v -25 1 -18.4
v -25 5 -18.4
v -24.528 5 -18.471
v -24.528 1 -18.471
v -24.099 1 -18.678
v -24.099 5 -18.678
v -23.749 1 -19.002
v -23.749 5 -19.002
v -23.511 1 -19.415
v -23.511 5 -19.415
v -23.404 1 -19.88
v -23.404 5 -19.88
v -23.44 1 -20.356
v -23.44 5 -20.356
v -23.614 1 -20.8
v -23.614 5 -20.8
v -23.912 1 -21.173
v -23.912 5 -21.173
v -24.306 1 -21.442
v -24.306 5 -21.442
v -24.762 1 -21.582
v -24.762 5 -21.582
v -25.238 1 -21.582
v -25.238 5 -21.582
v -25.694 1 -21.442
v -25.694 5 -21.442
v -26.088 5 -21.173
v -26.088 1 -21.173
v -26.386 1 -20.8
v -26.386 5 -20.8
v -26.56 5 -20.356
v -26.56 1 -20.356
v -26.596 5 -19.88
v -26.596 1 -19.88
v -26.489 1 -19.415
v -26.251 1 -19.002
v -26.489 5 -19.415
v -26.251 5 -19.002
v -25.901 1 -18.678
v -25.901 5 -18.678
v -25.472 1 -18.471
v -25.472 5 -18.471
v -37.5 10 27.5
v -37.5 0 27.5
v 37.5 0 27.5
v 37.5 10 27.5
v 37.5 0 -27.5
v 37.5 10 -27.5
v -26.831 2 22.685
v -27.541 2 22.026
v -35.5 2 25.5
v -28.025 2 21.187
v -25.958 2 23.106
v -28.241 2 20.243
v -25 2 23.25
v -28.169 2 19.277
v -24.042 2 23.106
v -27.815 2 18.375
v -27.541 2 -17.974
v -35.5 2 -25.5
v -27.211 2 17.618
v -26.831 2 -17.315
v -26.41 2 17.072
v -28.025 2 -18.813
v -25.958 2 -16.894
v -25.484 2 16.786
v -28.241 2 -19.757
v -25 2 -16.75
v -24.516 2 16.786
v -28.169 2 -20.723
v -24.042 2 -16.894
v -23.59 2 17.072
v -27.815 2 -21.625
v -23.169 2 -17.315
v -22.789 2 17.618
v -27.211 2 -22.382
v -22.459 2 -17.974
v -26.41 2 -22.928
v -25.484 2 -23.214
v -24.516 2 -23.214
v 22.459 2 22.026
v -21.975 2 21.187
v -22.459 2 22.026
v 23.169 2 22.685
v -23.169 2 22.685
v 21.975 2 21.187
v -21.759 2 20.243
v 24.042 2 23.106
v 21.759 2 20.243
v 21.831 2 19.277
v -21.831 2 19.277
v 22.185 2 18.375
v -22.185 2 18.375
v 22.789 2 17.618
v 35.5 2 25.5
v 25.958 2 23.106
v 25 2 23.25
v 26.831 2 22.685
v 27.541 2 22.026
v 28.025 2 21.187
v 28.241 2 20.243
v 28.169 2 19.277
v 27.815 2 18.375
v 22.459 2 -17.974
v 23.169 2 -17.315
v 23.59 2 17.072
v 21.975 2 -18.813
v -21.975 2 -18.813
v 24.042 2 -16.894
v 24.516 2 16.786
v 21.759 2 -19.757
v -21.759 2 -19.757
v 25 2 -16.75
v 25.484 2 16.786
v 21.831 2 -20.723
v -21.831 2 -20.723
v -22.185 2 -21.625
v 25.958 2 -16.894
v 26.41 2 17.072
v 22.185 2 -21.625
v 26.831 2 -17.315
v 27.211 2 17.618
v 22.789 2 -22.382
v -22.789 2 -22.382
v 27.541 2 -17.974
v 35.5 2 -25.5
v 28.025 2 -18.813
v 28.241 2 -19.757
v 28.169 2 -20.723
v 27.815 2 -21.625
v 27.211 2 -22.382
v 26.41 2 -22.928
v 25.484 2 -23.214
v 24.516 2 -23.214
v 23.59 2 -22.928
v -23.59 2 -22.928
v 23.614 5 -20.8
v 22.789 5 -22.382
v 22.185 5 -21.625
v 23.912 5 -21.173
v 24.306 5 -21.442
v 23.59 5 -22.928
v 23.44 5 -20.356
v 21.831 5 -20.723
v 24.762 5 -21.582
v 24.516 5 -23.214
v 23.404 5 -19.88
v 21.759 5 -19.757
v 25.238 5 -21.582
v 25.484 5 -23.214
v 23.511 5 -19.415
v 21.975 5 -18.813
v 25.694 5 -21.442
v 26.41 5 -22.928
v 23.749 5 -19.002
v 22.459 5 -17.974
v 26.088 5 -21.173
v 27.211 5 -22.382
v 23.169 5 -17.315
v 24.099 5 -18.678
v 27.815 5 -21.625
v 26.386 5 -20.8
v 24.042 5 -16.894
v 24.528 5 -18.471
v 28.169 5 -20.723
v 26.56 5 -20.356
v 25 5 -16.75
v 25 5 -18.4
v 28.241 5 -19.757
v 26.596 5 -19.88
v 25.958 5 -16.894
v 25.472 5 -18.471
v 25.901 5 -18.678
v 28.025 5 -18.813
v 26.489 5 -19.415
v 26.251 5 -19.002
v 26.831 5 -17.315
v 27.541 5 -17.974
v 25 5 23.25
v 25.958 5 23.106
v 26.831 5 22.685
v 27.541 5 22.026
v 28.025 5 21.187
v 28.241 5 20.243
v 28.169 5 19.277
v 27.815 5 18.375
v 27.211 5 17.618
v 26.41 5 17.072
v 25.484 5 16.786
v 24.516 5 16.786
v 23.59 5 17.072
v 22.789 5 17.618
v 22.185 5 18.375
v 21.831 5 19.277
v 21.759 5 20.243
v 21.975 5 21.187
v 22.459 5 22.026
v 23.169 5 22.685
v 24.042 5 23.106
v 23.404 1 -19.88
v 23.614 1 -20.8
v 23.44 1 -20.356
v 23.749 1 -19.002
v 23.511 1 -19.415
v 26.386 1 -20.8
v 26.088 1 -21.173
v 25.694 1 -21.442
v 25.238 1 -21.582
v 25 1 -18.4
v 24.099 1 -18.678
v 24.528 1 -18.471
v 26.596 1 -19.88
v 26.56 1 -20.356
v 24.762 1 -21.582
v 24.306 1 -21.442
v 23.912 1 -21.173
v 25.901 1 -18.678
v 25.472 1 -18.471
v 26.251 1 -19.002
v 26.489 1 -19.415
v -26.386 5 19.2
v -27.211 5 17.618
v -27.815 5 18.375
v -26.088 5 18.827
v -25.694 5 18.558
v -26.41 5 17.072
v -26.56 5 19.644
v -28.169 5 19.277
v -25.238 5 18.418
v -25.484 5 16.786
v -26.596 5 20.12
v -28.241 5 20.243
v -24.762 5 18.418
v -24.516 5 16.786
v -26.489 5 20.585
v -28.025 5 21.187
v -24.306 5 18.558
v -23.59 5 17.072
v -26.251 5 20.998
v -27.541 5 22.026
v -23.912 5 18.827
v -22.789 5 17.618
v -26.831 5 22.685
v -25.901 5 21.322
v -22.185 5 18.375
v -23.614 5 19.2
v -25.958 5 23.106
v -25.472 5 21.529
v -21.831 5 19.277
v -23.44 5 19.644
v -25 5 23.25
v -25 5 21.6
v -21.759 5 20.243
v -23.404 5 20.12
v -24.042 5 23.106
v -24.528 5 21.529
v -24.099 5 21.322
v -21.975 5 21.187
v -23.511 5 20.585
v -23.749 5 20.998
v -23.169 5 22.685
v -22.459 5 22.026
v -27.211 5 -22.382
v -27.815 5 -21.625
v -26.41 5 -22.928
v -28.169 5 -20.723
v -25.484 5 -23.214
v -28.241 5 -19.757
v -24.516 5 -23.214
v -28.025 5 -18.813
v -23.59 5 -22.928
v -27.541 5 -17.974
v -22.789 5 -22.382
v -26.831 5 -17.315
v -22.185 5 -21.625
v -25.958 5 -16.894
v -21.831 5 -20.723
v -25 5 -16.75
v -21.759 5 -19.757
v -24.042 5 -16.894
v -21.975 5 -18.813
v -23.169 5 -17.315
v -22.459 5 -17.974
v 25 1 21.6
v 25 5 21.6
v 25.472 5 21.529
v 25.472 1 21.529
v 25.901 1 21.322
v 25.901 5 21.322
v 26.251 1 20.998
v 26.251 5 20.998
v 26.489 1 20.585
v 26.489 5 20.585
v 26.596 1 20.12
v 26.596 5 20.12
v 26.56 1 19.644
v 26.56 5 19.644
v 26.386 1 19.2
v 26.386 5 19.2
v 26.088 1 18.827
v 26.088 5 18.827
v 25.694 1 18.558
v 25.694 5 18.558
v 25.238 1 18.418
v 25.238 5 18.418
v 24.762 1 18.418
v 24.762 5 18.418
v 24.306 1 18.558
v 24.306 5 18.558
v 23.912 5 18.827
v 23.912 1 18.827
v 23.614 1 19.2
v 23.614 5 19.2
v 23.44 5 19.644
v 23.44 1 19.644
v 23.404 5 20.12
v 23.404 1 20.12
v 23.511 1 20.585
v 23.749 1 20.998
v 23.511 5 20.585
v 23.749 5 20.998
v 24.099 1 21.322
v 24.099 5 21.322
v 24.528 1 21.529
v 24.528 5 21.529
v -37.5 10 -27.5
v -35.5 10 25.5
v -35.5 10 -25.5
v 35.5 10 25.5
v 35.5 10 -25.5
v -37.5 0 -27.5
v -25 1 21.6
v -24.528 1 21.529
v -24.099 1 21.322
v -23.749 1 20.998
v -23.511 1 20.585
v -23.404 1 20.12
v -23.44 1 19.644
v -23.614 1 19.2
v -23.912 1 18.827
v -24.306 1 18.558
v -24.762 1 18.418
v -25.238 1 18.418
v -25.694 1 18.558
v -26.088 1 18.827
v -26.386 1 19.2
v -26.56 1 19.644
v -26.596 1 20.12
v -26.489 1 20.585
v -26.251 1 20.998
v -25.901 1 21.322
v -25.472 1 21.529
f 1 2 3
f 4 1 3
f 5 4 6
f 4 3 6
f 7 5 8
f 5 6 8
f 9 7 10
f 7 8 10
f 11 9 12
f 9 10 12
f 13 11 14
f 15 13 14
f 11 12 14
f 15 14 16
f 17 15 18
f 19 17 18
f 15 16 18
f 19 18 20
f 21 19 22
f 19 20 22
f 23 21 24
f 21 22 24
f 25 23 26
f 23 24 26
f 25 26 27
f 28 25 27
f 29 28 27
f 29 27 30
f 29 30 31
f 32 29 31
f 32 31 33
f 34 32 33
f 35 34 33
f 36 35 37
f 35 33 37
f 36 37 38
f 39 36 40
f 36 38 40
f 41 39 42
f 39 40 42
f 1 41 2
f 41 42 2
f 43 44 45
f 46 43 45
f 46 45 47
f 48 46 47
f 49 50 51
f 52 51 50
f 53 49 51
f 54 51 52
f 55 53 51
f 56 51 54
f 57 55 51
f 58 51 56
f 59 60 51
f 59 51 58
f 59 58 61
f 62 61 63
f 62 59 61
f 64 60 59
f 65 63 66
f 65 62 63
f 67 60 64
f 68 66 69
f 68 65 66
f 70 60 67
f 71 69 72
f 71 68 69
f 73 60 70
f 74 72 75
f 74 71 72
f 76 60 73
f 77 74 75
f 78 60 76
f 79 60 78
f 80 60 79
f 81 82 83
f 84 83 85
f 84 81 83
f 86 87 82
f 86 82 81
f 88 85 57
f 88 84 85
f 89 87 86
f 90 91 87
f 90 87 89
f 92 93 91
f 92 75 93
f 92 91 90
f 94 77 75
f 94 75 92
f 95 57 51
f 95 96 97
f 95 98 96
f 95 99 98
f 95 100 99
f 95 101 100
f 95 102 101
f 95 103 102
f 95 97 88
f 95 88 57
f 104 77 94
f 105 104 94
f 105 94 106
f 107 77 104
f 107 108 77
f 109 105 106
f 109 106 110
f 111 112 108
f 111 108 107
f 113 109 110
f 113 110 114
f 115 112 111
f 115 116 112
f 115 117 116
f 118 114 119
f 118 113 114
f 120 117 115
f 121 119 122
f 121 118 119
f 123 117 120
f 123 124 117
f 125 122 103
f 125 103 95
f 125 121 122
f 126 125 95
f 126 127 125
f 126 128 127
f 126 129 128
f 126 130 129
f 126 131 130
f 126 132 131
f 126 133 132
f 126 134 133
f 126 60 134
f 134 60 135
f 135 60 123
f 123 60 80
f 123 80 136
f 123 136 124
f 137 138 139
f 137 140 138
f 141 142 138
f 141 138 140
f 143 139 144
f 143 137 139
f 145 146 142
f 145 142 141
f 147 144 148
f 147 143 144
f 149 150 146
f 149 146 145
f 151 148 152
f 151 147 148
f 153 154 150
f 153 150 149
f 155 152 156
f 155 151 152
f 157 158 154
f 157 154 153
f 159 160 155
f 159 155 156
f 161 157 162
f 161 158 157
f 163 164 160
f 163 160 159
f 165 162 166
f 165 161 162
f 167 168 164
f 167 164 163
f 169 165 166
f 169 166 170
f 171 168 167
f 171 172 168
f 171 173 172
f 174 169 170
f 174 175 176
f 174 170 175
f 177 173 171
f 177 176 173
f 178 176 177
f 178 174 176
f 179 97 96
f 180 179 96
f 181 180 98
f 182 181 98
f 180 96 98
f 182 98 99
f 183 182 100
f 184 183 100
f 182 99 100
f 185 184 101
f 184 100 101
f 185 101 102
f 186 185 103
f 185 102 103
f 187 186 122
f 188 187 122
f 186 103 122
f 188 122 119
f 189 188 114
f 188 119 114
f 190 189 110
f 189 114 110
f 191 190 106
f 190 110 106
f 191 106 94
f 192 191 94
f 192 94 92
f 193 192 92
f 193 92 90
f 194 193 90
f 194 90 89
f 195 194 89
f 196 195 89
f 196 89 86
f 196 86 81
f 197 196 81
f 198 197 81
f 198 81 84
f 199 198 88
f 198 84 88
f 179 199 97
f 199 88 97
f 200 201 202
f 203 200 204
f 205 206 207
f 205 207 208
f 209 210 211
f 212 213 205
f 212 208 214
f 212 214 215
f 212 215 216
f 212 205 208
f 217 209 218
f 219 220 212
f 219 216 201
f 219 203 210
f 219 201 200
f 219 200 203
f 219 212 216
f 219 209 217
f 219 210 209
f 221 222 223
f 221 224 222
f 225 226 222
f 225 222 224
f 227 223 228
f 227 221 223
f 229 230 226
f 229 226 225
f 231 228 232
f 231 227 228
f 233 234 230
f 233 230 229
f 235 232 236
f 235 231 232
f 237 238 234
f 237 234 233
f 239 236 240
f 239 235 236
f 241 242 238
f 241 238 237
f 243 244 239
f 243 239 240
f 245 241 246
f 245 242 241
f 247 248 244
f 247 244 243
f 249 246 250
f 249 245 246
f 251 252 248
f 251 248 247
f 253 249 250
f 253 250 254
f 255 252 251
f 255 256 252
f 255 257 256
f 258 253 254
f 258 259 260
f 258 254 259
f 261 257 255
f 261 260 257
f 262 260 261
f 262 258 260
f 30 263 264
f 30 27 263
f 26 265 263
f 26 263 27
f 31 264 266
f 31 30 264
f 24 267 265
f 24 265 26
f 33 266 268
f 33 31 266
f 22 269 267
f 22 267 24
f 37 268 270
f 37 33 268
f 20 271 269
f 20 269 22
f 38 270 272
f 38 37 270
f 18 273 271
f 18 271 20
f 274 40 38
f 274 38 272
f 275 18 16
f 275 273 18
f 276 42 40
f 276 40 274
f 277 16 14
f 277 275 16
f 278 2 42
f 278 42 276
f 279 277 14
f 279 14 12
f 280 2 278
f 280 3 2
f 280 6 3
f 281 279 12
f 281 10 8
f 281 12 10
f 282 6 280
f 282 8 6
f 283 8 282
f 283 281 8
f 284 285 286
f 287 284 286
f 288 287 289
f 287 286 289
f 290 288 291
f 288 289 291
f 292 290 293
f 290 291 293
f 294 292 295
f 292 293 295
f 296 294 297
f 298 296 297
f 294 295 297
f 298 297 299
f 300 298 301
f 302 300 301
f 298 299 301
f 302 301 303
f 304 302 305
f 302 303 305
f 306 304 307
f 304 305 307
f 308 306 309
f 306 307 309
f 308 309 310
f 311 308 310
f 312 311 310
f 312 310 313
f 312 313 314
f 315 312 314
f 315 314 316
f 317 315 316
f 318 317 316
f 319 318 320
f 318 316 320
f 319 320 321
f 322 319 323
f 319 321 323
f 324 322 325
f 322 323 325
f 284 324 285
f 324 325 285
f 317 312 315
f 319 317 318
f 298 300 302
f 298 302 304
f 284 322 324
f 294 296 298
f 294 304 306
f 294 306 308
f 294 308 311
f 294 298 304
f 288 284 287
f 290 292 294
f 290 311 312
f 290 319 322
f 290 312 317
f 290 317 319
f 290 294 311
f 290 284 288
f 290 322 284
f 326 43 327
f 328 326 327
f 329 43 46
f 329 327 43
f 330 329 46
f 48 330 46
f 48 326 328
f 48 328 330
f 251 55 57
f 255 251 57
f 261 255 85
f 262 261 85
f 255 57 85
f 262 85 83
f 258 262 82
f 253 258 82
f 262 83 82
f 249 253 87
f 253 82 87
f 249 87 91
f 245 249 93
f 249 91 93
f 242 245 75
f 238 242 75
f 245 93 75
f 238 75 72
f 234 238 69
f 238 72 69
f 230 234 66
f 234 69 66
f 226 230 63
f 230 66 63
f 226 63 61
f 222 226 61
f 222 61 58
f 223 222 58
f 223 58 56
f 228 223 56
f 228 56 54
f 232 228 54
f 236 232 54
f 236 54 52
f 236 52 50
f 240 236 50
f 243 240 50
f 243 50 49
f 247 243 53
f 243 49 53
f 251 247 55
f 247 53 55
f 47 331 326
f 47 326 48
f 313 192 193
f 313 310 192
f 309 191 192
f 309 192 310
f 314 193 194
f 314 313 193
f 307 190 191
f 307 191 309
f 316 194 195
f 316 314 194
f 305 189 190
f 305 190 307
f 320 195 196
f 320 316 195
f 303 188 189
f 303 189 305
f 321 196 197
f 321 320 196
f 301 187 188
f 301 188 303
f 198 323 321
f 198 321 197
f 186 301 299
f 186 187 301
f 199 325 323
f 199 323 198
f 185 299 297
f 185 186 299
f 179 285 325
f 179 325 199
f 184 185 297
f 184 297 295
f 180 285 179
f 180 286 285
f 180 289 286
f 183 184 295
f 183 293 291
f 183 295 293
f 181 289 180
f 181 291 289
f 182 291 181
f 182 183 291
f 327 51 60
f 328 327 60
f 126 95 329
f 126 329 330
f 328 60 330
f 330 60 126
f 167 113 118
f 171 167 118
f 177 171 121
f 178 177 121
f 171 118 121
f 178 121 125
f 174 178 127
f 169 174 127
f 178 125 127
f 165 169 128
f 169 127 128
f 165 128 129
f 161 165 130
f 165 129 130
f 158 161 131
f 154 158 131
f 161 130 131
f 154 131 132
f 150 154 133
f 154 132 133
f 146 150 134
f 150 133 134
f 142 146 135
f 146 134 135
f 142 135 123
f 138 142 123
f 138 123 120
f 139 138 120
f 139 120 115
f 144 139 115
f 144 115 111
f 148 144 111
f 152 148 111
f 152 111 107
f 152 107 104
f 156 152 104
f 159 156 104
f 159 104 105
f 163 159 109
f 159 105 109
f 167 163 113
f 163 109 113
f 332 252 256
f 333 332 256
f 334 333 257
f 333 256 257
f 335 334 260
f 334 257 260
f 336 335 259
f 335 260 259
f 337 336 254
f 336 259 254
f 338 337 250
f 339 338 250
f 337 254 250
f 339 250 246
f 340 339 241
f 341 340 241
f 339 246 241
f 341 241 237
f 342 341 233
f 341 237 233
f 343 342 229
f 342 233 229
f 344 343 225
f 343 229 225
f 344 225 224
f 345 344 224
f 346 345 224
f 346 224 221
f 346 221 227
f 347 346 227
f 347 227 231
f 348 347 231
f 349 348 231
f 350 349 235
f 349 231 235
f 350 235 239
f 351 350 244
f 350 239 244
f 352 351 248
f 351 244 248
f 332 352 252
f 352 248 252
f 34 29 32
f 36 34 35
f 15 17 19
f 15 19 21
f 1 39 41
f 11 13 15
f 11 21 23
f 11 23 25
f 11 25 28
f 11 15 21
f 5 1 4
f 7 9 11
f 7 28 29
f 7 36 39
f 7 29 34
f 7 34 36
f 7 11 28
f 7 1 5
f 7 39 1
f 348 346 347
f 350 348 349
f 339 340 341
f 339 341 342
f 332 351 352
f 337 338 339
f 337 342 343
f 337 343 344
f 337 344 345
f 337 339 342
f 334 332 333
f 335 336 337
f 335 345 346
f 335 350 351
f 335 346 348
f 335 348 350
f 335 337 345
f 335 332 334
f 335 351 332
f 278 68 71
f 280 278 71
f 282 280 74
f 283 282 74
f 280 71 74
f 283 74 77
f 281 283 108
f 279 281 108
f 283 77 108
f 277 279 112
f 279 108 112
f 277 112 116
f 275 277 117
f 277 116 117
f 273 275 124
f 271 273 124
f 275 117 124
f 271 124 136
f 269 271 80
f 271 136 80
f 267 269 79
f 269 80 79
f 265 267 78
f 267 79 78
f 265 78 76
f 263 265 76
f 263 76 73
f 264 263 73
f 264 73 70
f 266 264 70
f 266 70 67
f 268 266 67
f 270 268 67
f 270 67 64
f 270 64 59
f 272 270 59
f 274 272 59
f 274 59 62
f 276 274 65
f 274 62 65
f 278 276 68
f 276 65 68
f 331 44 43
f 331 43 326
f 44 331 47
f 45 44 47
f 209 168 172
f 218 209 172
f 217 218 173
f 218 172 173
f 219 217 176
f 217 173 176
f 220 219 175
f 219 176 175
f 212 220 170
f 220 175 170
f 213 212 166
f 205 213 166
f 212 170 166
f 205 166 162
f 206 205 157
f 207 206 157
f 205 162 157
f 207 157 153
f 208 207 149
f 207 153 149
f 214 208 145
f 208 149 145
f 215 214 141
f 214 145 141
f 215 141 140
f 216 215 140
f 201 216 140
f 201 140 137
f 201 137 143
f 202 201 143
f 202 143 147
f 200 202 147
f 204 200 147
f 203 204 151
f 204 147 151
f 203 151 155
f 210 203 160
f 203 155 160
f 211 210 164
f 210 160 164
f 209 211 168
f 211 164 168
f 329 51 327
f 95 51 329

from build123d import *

# Parameters (mm, degrees)
SKETCH1_W             = 75
SKETCH1_H             = 55
BODY_DEPTH            = 10
SHELL1_T              = -2
SKETCH2_R             = 3.25
INSERTS_SUPPORT_DEPTH = 3
SKETCH3_R             = 1.6
INSERTS_HOLES_DEPTH   = 4


with BuildPart() as part:
    # Sketch1 → Body (new body)
    with BuildSketch(Plane(origin=(0, 0, 0), x_dir=(1, 0, 0), z_dir=(0, 1, 0))):
        Rectangle(SKETCH1_W, SKETCH1_H)
    extrude(amount=BODY_DEPTH)

    # Shell1
    shell1_openings = [part.faces().sort_by_distance(p)[0] for p in [
        (0, 10, 0),
    ]]
    offset(amount=SHELL1_T, openings=shell1_openings, kind=Kind.INTERSECTION)

    # Sketch2 → Inserts_Support (add)
    with BuildSketch(Plane(origin=(0, 2, 0), x_dir=(1, 0, 0), z_dir=(0, 1, 0))):
        with Locations(Location((-25, 20, 0), (0, 0, 270))):
            Circle(SKETCH2_R)
        with Locations(Location((25, 20, 0), (0, 0, 270))):
            Circle(SKETCH2_R)
        with Locations(Location((25, -20, 0), (0, 0, 270))):
            Circle(SKETCH2_R)
        with Locations(Location((-25, -20, 0), (0, 0, 270))):
            Circle(SKETCH2_R)
    extrude(amount=INSERTS_SUPPORT_DEPTH)

    # Sketch3 → Inserts_Holes (cut)
    with BuildSketch(Plane(origin=(0, 5, 0), x_dir=(1, 0, 0), z_dir=(0, 1, 0))):
        with Locations(Location((-25, 20, 0), (0, 0, 270))):
            Circle(SKETCH3_R)
        with Locations(Location((25, 20, 0), (0, 0, 270))):
            Circle(SKETCH3_R)
        with Locations(Location((25, -20, 0), (0, 0, 270))):
            Circle(SKETCH3_R)
        with Locations(Location((-25, -20, 0), (0, 0, 270))):
            Circle(SKETCH3_R)
    extrude(amount=-INSERTS_HOLES_DEPTH, mode=Mode.SUBTRACT)


solid = part.part
